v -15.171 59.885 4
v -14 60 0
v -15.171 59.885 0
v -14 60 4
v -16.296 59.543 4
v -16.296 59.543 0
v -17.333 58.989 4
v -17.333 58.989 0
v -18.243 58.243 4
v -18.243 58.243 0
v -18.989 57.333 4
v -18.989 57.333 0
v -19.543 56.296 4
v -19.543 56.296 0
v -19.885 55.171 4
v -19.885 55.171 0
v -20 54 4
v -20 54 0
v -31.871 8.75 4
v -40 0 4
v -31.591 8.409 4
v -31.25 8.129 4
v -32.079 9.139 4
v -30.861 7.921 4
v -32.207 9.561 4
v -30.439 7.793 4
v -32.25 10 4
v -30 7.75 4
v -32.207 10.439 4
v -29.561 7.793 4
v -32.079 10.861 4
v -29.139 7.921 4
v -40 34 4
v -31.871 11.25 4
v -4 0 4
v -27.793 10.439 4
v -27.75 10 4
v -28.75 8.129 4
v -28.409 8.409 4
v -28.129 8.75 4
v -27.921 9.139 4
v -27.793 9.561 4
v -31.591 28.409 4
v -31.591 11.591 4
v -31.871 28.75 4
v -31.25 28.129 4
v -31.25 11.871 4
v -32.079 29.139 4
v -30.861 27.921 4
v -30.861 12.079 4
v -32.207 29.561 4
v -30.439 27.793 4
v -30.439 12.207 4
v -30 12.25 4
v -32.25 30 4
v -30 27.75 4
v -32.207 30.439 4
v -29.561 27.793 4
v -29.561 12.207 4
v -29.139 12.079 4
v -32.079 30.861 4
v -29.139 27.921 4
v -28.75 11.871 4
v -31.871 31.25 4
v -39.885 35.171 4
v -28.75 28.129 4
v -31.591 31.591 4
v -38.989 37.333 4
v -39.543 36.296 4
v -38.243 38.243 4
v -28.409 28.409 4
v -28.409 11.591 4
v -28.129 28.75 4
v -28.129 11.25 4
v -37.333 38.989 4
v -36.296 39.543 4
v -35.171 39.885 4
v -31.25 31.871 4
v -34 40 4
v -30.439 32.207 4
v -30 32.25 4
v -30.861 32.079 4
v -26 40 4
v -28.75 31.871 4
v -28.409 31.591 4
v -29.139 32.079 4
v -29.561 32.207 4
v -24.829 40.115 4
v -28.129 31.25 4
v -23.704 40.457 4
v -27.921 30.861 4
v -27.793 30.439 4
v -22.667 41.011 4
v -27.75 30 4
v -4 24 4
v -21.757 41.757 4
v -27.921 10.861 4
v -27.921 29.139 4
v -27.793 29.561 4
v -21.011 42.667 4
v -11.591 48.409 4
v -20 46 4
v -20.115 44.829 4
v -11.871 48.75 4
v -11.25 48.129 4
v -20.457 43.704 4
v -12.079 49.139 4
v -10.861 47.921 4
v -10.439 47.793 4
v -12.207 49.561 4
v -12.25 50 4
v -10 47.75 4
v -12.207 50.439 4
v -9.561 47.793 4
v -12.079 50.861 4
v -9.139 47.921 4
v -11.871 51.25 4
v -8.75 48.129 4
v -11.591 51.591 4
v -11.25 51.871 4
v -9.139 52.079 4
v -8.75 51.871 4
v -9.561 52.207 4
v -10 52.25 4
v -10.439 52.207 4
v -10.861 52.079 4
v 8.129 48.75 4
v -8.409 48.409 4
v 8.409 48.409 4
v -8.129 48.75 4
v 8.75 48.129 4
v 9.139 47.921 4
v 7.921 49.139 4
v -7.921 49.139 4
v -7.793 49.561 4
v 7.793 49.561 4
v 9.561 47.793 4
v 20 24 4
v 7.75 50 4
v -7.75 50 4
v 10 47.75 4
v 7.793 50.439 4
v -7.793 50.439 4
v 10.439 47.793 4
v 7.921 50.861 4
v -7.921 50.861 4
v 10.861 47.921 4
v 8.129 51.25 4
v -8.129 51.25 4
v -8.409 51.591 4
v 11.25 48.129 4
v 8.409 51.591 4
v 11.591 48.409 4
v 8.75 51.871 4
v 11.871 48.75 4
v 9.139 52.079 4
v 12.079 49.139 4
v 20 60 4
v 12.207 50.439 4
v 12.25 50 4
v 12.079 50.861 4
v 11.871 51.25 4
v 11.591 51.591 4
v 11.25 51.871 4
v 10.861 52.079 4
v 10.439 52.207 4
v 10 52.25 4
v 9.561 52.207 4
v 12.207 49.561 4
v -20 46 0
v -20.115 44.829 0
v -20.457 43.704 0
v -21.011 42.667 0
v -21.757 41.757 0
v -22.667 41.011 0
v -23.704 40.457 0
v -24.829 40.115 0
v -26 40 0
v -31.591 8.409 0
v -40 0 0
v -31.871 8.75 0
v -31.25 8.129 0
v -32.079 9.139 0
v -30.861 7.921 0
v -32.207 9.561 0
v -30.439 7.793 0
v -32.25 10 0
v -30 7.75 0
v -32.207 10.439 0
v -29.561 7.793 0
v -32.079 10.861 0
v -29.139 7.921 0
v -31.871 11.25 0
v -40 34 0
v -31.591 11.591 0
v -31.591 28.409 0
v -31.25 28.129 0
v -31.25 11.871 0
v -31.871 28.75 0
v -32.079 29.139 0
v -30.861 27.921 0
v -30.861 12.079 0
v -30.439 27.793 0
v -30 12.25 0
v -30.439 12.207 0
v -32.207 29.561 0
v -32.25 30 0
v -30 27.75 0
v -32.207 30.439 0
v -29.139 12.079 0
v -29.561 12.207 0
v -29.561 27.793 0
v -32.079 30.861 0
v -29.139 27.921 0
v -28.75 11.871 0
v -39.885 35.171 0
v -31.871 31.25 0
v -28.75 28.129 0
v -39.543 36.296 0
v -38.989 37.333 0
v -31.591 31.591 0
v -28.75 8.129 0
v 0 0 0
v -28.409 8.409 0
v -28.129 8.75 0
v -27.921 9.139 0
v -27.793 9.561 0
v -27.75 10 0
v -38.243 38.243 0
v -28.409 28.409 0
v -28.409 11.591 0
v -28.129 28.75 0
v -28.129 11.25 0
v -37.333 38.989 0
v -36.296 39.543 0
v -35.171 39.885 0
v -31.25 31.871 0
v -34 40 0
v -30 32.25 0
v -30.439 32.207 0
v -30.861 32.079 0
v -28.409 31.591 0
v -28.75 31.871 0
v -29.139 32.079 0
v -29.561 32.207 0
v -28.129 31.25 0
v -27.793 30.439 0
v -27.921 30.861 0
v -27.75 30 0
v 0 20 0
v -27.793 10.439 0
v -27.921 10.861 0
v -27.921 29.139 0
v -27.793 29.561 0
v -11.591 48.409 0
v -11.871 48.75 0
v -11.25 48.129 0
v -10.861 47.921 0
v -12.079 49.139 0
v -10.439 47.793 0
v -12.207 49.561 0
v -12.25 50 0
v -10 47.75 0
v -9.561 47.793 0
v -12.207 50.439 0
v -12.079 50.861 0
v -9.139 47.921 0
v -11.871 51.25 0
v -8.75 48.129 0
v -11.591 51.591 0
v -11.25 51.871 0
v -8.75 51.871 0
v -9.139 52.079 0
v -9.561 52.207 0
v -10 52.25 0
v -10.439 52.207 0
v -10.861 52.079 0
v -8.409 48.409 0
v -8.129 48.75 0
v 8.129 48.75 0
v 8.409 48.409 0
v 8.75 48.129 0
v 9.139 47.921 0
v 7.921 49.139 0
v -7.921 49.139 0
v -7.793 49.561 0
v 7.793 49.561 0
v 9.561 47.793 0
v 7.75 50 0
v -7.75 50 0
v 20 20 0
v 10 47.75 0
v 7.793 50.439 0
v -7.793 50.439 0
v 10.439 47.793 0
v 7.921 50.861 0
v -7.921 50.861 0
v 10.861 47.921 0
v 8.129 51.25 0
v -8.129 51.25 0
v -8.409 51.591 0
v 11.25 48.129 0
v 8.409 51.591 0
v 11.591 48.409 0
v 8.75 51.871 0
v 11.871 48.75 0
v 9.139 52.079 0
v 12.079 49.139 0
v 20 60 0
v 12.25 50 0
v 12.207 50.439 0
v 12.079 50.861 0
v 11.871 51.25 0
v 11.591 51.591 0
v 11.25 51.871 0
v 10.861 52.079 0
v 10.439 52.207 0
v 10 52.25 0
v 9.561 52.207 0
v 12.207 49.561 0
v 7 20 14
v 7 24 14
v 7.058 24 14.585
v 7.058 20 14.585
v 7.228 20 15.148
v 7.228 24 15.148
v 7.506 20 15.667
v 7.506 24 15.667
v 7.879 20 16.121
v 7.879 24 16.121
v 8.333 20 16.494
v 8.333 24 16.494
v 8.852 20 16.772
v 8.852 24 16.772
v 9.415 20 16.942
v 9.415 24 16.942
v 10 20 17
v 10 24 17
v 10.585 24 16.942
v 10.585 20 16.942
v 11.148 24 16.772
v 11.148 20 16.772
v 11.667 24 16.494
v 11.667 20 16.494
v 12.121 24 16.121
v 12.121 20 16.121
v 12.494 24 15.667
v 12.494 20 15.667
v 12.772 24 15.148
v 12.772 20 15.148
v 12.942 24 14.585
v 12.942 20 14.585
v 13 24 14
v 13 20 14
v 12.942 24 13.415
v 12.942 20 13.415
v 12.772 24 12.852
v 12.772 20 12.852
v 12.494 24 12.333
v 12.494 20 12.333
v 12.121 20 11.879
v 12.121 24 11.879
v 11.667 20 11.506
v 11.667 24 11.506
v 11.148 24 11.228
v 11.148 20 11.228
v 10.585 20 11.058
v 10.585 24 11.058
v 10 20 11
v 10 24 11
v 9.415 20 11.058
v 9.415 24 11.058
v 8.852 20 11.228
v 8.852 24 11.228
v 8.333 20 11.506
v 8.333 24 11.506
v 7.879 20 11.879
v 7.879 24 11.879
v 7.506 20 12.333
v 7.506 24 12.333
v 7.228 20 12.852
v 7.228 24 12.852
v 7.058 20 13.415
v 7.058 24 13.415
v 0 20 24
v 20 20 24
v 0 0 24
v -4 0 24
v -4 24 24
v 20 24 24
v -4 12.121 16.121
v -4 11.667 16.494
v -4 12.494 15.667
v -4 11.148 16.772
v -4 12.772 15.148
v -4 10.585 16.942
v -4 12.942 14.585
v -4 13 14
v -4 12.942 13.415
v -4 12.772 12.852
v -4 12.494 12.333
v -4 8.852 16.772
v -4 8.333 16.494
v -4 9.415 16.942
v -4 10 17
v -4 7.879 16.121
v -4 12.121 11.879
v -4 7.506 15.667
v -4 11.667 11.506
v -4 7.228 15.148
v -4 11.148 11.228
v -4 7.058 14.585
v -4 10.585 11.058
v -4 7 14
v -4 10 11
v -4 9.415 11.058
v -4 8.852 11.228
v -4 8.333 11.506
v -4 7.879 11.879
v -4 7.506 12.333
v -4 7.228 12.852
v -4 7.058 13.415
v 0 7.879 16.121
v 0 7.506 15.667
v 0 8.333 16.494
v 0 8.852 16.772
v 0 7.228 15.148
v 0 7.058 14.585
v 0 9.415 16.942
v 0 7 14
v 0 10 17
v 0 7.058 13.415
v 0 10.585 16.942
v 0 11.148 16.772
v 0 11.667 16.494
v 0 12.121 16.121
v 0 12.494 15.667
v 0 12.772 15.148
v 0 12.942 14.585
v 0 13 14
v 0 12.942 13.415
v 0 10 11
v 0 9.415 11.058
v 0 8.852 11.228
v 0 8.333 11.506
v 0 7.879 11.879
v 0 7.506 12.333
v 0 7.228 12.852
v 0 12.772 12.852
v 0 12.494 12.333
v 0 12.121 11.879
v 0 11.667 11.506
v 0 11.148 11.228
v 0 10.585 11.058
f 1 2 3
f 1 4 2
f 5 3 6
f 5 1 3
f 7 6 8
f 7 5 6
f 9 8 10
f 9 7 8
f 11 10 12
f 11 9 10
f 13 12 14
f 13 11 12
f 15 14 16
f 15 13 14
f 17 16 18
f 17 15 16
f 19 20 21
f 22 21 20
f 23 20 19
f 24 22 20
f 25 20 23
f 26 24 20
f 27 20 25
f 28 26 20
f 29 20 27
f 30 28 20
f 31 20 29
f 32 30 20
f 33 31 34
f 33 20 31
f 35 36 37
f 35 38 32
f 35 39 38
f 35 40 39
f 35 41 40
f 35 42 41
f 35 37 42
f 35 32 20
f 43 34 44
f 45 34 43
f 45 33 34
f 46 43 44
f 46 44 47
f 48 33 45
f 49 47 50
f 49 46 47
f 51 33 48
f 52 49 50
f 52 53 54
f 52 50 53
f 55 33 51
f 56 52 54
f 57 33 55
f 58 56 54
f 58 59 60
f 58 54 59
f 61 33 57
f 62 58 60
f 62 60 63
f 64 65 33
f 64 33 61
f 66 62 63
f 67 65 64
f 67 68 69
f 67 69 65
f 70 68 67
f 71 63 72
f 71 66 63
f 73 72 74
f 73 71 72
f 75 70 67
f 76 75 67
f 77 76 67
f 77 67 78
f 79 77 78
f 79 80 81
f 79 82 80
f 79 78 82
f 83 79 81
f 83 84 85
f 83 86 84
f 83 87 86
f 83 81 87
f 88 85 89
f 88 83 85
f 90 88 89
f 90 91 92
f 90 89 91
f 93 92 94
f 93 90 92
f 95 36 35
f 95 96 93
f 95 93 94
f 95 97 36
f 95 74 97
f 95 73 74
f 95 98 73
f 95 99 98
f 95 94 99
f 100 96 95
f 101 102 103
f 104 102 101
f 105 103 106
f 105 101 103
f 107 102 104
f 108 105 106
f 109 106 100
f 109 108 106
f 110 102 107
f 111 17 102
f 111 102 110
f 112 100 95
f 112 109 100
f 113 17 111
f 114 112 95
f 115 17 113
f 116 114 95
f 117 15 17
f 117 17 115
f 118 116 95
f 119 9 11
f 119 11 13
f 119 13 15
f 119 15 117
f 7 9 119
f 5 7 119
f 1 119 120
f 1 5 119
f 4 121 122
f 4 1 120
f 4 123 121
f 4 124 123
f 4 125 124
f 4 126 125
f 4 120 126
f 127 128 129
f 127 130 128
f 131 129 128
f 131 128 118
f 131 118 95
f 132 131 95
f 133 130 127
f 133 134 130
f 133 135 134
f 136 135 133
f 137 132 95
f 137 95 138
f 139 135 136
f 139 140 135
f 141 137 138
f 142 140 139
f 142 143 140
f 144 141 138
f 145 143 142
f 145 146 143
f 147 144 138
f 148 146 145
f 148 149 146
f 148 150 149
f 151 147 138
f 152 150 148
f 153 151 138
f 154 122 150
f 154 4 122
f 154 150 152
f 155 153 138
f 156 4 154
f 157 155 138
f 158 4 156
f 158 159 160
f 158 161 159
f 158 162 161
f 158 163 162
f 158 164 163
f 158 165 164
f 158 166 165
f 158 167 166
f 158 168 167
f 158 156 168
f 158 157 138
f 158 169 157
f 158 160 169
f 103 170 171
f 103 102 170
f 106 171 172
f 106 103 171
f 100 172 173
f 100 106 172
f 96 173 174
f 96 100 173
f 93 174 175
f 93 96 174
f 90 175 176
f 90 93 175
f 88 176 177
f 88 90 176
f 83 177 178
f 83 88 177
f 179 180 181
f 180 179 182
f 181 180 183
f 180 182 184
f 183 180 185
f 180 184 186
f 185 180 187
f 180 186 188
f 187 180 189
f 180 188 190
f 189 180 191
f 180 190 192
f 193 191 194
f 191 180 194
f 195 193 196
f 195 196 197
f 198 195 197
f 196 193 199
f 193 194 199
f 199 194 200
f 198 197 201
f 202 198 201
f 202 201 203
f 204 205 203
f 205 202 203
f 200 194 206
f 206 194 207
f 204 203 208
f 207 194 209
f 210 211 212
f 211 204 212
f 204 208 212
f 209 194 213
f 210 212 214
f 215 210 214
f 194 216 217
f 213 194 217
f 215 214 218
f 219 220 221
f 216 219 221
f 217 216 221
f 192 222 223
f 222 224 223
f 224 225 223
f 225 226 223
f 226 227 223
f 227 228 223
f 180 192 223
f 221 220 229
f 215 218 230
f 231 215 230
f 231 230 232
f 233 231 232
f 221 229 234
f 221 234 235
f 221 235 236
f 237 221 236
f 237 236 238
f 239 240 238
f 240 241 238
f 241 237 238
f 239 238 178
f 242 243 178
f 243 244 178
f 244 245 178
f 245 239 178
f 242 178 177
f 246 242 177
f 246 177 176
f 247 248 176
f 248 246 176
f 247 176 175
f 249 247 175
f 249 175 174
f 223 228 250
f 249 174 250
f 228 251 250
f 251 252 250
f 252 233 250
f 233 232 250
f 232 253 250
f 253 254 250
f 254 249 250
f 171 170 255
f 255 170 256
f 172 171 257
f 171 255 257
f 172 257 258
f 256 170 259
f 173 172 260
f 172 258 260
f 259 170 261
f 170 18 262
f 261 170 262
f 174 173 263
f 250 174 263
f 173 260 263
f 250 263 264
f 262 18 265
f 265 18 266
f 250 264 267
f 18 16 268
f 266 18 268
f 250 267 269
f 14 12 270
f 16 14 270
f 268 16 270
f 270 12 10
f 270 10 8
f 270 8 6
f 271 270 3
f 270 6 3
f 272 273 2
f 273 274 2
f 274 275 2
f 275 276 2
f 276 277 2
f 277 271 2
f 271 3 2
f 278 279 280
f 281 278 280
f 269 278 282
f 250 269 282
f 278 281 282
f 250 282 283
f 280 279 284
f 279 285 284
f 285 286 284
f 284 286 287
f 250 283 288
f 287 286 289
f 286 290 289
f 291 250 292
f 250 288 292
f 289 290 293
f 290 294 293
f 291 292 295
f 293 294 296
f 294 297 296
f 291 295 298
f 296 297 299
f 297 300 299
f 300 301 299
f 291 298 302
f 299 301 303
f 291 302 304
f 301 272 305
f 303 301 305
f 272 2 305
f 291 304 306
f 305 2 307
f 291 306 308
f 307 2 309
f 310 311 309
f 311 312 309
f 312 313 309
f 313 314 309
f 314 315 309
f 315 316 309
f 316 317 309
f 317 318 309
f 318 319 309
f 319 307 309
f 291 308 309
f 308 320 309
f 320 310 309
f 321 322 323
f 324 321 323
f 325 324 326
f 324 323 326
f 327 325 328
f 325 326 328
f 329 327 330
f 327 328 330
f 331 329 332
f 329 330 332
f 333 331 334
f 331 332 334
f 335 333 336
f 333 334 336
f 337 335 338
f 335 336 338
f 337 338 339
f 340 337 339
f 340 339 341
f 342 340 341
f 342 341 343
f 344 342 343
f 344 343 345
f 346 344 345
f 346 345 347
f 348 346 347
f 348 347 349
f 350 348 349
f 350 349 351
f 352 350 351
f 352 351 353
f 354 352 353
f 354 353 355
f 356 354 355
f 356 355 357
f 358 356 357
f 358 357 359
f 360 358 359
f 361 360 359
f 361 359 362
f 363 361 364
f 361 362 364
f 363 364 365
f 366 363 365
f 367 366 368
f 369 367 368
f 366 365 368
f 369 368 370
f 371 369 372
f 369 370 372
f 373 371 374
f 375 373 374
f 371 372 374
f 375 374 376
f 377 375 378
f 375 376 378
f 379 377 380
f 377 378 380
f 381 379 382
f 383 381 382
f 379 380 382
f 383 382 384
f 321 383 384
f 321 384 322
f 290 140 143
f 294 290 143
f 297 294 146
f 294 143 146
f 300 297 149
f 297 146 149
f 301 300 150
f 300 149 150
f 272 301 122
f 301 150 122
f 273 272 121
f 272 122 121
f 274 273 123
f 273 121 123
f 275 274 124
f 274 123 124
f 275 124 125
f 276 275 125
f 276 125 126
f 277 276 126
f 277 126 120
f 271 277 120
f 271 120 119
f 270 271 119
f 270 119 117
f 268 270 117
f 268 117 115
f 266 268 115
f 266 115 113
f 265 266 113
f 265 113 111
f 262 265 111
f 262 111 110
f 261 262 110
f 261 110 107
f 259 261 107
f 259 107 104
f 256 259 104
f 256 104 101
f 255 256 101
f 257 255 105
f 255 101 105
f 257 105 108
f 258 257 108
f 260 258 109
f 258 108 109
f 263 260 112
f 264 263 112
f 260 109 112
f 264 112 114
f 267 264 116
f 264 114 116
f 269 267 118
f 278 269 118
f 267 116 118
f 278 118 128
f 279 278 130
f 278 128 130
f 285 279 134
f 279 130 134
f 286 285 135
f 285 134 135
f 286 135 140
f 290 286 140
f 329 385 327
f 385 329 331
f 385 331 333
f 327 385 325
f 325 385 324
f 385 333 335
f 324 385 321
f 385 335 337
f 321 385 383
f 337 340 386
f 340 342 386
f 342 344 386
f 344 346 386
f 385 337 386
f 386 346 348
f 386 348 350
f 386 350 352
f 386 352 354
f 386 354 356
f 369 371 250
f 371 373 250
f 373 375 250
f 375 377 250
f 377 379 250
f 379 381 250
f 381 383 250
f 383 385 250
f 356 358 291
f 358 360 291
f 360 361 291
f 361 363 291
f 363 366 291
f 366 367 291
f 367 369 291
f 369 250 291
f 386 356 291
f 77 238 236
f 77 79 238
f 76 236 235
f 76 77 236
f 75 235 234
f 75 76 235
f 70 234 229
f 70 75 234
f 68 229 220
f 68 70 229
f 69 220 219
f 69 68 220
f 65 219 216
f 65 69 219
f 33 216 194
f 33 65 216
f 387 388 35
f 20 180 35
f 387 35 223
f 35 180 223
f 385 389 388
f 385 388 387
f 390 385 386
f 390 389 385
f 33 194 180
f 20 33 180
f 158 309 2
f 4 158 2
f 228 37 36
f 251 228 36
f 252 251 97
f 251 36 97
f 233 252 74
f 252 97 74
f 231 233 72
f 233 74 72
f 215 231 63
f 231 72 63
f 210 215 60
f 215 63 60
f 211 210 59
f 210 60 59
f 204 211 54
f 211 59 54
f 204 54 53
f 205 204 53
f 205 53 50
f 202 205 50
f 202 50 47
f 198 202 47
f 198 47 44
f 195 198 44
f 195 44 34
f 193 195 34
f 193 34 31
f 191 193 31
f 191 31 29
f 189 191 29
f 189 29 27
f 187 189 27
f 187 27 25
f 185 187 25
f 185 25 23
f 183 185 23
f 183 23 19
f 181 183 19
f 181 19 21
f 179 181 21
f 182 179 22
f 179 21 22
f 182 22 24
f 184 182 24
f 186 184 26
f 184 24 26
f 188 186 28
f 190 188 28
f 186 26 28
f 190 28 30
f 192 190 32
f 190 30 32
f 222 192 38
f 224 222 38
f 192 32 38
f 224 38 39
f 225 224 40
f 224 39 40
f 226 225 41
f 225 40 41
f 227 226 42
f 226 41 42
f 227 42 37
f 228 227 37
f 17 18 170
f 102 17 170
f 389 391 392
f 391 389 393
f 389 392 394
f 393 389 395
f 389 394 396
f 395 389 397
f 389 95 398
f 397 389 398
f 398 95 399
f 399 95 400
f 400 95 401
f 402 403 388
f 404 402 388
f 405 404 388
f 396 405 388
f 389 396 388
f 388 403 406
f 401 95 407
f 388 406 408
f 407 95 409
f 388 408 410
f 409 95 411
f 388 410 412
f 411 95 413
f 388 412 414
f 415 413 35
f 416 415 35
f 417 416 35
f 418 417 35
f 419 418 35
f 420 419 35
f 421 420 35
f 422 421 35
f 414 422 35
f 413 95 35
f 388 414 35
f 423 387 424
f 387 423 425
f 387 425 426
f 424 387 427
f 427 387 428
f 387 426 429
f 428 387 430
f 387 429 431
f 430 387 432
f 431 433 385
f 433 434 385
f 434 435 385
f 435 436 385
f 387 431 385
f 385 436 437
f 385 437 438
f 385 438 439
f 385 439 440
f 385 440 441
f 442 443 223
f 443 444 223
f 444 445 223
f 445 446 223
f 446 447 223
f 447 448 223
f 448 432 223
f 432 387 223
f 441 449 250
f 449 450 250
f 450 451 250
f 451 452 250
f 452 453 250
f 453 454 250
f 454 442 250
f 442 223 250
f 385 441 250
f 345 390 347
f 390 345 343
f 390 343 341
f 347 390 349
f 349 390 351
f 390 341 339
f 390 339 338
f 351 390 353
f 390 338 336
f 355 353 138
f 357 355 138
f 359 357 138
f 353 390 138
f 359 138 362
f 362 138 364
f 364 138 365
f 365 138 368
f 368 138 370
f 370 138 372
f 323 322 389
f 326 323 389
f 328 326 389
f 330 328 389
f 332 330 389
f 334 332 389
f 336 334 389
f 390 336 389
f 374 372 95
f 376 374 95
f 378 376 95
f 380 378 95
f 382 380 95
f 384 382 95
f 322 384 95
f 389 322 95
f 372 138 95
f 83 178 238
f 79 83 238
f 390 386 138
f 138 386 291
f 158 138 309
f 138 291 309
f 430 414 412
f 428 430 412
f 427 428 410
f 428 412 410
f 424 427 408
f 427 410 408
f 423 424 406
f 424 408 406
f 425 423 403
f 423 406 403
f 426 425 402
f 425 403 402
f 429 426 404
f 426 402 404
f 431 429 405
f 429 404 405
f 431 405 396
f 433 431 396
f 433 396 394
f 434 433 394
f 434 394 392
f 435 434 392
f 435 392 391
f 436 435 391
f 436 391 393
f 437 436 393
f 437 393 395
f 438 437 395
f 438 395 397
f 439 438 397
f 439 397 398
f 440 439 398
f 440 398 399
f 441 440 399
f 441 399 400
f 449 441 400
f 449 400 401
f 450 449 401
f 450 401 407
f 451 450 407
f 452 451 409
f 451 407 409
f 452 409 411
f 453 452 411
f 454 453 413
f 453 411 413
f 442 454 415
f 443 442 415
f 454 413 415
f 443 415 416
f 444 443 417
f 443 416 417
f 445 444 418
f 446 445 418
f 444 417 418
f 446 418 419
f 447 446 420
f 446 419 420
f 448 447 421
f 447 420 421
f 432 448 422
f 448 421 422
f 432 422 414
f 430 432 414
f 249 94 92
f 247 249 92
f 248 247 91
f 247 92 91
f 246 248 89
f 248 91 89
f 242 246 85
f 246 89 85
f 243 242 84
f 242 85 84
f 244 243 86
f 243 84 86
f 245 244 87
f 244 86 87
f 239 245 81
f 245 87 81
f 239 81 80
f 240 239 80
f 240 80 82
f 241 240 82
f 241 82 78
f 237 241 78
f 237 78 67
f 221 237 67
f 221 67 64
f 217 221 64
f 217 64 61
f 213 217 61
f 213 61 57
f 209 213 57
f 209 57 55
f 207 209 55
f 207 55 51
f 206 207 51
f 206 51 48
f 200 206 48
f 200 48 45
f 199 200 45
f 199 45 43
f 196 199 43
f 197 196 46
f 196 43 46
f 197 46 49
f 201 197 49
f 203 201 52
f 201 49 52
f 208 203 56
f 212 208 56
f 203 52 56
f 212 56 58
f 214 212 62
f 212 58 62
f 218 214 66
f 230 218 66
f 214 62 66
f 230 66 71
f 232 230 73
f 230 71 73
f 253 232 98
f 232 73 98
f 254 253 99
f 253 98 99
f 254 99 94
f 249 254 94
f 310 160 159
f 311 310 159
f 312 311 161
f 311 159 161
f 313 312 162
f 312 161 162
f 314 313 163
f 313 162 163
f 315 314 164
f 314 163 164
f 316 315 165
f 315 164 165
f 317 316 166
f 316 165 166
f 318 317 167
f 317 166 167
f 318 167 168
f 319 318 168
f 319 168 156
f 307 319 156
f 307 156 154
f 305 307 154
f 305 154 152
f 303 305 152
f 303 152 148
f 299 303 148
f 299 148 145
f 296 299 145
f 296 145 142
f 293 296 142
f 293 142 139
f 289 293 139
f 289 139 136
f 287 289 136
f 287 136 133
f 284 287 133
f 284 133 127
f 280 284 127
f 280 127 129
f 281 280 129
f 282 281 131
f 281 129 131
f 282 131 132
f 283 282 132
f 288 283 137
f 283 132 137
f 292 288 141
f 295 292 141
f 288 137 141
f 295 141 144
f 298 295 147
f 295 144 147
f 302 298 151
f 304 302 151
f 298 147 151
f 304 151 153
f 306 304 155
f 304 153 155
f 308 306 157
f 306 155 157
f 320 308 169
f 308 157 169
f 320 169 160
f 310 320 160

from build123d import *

# Parameters (mm, degrees)
BOSS_EXTRU_1_DEPTH      = 4
BOSS_EXTRU_2_DEPTH      = 20
ESQUISSE3_R             = 3
ENL_V_MAT_EXTRU_1_DEPTH = 25
ESQUISSE4_R             = 3
ENL_V_MAT_EXTRU_2_DEPTH = 25
ESQUISSE5_R             = 2.25
ENL_V_MAT_EXTRU_3_DEPTH = 5
CONG_1_R                = 6


with BuildPart() as part:
    # Esquisse1 → Boss.-Extru.1 (new body)
    with BuildSketch(Plane.XY):
        Polygon((-20, 60), (-20, 40), (-40, 40), (-40, 0), (0, 0), (0, 20), (20, 20), (20, 60), align=None)
    extrude(amount=BOSS_EXTRU_1_DEPTH)

    # Esquisse2 → Boss.-Extru.2 (add)
    with BuildSketch(Plane.XY.offset(4)):
        Polygon((20, 20), (20, 24), (-4, 24), (-4, 0), (0, 0), (0, 20), align=None)
    extrude(amount=BOSS_EXTRU_2_DEPTH)

    # Esquisse3 → Enlèv. mat.-Extru.1 (cut, through all)
    with BuildSketch(Plane.ZY.offset(4)):
        with Locations(Location((14, 10, 0), (0, 0, 270))):  # turned: the seam where the file's is
            Circle(ESQUISSE3_R)
    extrude(amount=-ENL_V_MAT_EXTRU_1_DEPTH, mode=Mode.SUBTRACT)

    # Esquisse4 → Enlèv. mat.-Extru.2 (cut, through all)
    with BuildSketch(Plane(origin=(0, 24, 0), x_dir=(1, 0, 0), z_dir=(0, 1, 0))):
        with Locations(Location((10, -14, 0), (0, 0, 180))):  # turned: the seam where the file's is
            Circle(ESQUISSE4_R)
    extrude(amount=-ENL_V_MAT_EXTRU_2_DEPTH, mode=Mode.SUBTRACT)

    # Esquisse5 → Enlèv. mat.-Extru.3 (cut, through all)
    with BuildSketch(Plane.XY.offset(4)):
        with Locations((10, 50)):
            Circle(ESQUISSE5_R)
        with Locations((-10, 50)):
            Circle(ESQUISSE5_R)
        with Locations((-30, 30)):
            Circle(ESQUISSE5_R)
        with Locations((-30, 10)):
            Circle(ESQUISSE5_R)
    extrude(amount=-ENL_V_MAT_EXTRU_3_DEPTH, mode=Mode.SUBTRACT)

    # Congé1
    cong_1_edges = [part.edges().sort_by_distance(p)[0] for p in [
        (-40, 40, 2),
        (-20, 40, 2),
        (-20, 60, 2),
    ]]
    fillet(cong_1_edges, radius=CONG_1_R)


solid = part.part
